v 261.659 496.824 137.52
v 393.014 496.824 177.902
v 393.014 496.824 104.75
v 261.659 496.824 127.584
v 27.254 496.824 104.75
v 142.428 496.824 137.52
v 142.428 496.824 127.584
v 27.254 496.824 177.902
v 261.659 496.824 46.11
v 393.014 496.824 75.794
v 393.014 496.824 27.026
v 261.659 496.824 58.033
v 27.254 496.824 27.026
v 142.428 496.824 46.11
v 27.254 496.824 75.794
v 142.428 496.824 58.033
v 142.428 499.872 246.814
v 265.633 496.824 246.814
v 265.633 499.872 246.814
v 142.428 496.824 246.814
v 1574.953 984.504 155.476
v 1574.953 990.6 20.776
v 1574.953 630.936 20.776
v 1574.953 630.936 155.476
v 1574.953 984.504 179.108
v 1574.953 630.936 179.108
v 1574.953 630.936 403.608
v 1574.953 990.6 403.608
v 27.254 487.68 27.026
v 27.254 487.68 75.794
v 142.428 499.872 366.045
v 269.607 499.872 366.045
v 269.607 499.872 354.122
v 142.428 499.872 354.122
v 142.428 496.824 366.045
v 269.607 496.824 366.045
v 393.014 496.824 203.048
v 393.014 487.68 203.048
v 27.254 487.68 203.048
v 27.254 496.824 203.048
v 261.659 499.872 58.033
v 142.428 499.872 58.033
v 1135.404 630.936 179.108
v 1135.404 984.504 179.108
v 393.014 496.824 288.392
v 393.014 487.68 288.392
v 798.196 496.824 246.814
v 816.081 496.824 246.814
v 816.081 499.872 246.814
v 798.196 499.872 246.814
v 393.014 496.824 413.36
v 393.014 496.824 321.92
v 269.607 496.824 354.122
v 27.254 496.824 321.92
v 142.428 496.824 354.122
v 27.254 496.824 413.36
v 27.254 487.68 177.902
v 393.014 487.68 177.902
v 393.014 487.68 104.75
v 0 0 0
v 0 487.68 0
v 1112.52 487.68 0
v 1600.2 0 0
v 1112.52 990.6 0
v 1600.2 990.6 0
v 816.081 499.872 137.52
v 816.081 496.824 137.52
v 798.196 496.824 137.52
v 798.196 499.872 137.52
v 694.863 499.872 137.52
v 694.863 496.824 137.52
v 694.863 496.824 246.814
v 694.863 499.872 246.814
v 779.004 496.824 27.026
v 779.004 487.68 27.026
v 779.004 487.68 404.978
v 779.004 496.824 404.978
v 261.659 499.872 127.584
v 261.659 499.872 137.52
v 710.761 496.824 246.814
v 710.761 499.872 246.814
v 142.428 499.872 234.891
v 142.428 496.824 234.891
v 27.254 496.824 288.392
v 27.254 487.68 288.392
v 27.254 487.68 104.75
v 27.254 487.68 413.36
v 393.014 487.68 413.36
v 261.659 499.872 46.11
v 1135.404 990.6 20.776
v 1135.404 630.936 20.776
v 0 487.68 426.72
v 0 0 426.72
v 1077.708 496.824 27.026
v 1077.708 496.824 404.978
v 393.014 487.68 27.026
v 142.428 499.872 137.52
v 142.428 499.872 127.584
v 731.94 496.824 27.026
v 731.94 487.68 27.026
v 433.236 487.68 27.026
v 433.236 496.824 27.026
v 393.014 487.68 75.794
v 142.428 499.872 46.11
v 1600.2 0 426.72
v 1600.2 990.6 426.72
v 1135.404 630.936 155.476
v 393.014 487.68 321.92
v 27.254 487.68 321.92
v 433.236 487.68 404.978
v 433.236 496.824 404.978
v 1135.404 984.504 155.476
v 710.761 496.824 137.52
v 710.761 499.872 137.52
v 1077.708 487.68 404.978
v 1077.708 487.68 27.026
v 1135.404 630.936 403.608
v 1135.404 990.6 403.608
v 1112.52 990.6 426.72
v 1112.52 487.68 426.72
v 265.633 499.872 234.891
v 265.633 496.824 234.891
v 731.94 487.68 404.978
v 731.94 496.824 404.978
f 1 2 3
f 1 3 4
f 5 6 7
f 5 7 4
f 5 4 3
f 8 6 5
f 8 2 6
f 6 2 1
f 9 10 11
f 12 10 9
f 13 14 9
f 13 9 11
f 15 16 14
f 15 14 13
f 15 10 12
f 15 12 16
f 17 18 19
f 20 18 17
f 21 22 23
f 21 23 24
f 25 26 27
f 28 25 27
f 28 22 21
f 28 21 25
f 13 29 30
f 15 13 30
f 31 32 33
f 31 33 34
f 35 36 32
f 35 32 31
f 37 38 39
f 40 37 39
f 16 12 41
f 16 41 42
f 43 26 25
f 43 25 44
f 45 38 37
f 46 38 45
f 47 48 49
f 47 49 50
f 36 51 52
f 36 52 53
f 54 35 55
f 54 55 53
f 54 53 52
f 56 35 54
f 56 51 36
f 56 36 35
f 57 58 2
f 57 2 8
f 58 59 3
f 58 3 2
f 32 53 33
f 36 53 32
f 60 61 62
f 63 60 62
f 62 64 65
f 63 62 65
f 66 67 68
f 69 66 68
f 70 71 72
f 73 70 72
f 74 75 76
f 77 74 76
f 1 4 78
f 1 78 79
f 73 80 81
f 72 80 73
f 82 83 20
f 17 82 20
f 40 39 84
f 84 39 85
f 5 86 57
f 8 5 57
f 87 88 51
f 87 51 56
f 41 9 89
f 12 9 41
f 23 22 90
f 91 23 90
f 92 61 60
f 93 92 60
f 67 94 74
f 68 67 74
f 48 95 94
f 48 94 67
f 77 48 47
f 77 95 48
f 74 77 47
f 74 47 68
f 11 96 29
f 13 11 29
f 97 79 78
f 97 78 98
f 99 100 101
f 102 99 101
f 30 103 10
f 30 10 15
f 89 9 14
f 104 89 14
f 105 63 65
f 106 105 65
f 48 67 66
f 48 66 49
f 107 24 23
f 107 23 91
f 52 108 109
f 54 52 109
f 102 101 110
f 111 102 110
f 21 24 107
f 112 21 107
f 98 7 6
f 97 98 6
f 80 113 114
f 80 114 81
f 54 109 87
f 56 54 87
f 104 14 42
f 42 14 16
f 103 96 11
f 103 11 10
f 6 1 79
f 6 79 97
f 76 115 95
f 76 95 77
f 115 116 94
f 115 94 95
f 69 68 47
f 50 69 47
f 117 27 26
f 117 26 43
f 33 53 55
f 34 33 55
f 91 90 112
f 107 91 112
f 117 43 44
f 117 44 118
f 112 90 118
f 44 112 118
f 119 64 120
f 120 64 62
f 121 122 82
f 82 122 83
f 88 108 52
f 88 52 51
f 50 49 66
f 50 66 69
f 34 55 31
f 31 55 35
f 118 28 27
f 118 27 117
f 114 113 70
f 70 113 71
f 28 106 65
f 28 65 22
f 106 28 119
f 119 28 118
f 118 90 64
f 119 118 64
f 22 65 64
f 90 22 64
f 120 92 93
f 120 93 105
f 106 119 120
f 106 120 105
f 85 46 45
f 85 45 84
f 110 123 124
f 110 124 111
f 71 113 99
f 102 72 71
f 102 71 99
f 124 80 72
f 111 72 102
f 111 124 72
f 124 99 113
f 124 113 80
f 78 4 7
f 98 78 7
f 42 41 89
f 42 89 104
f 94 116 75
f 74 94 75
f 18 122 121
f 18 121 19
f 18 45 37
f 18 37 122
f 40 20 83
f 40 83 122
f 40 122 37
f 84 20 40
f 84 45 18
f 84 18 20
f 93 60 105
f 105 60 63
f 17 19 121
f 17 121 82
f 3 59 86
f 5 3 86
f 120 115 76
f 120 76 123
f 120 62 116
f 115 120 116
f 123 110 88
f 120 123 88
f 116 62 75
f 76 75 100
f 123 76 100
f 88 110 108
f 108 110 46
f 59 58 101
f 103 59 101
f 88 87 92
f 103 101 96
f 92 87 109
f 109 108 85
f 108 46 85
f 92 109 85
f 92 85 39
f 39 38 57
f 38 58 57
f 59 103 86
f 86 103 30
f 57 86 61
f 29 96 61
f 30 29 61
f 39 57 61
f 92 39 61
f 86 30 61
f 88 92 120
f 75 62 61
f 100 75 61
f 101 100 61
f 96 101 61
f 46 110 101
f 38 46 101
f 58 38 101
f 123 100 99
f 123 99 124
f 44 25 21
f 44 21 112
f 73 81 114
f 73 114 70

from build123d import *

# Parameters (mm, degrees)
F1_DEPTH = 426.72
F2_W     = 365.76
F2_H     = 48.768
F2_H_2   = 73.152
F2_H_3   = 85.344
F2_H_4   = 91.44
F2_W_2   = 298.704
F2_H_5   = 377.952
F3_DEPTH = 9.144
F4_W     = 119.230599
F4_H     = 11.923056
F4_H_2   = 9.935886
F4_W_2   = 123.204947
F4_H_3   = 11.92306
F4_W_3   = 127.179295
F4_H_4   = 11.923045
F4_W_4   = 15.897393
F4_H_5   = 109.294712
F4_W_5   = 17.884612
F5_DEPTH = 12.192
F6_W     = 439.548612
F6_H     = 382.832659
F7_DEPTH = 359.664
F8_W     = 439.548612
F8_H     = 23.631648
F9_DEPTH = 353.568


with BuildPart() as f1:
    # F0 (on Top) → F1 (new body)
    with BuildSketch(Plane.XY):
        Polygon((0, 487.68), (0, 0), (1600.2, 0), (1600.2, 990.6), (1112.52, 990.6), (1112.52, 487.68), align=None)
    extrude(amount=F1_DEPTH)

    # F2 (on face) → F3 (join)
    with BuildSketch(Plane(origin=(0, 487.68, 0), x_dir=(-1, 0, 0), z_dir=(0, 1, 0))):
        with Locations((-210.133546, 51.409847)):
            Rectangle(F2_W, F2_H)
        with Locations((-210.133546, 141.325856)):
            Rectangle(F2_W, F2_H_2)
        with Locations((-210.133546, 245.719852)):
            Rectangle(F2_W, F2_H_3)
        with Locations((-210.133546, 367.639854)):
            Rectangle(F2_W, F2_H_4)
        with Locations((-582.587673, 216.001847)):
            Rectangle(F2_W_2, F2_H_5)
        with Locations((-928.356364, 216.001847)):
            Rectangle(F2_W_2, F2_H_5)
    extrude(amount=F3_DEPTH)

    # F4 (on face) → F5 (join)
    with BuildSketch(Plane(origin=(0, 487.68, 0), x_dir=(-1, 0, 0), z_dir=(0, 1, 0))):
        with Locations((-202.043369, 52.071078)):
            Rectangle(F4_W, F4_H)
        with Locations((-202.043369, 132.55173)):
            Rectangle(F4_W, F4_H_2)
        with Locations((-204.030543, 240.852855)):
            Rectangle(F4_W_2, F4_H_3)
        with Locations((-206.017718, 360.083445)):
            Rectangle(F4_W_3, F4_H_4)
        with Locations((-702.811837, 192.167029)):
            Rectangle(F4_W_4, F4_H_5)
        with Locations((-807.138622, 192.167029)):
            Rectangle(F4_W_5, F4_H_5)
    extrude(amount=F5_DEPTH)

    # F6 (on face) → F7 (cut)
    with BuildSketch(Plane(origin=(0, 990.6, 0), x_dir=(-1, 0, 0), z_dir=(0, 1, 0))):
        with Locations((-1355.178416, 212.191843)):
            Rectangle(F6_W, F6_H)
    extrude(amount=-F7_DEPTH, mode=Mode.SUBTRACT)

    # F8 (on face) → F9 (join)
    with BuildSketch(Plane(origin=(0, 630.936, 0), x_dir=(-1, 0, 0), z_dir=(0, 1, 0))):
        with Locations((-1355.178416, 167.291738)):
            Rectangle(F8_W, F8_H)
    extrude(amount=F9_DEPTH)


solid = f1.part
